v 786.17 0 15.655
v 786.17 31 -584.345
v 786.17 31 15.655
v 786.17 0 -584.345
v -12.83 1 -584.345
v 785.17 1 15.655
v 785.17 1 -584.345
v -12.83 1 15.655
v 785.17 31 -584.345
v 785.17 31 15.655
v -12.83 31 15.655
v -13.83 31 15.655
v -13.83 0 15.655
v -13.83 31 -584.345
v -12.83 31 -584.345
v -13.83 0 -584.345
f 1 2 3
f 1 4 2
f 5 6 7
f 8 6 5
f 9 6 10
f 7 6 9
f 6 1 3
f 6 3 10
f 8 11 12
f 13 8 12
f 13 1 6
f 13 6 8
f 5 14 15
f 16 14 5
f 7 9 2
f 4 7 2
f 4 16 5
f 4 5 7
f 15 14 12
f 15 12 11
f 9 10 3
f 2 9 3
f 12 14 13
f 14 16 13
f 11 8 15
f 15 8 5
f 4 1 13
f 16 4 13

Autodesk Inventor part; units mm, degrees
ref_plane "YZ Plane" through (0, 0, 0) normal (1, 0, 0) x (0, 1, 0)
ref_plane "XZ Plane" through (0, 0, 0) normal (0, 1, 0) x (-1, 0, 0)
ref_plane "XY Plane" through (0, 0, 0) normal (0, 0, 1) x (1, 0, 0)
sketch "Эскиз1" plane through (0, 0, 0) normal (0, 1, 0) x (-1, 0, 0)
  line L0 (13.83, 15.6551) -> (-786.17, 15.6551)
  line L1 (-786.17, 15.6551) -> (-786.17, -584.3449)
  line L2 (-786.17, -584.3449) -> (13.83, -584.3449)
  line L3 (13.83, -584.3449) -> (13.83, 15.6551)
  point P0 (0, 0)
  dimension "d0" = 800
  dimension "d1" = 600
extrude "Выдавливание1" add sketch "Эскиз1" along normal blind 1
sketch "Эскиз2" plane through (0, 1, 0) normal (0, 1, 0) x (1, 0, 0)
  point P0 (0, 0)
sketch "Эскиз3" plane through (0, 1, 0) normal (0, 1, 0) x (1, 0, 0)
  line L0 (-13.83, 584.3449) -> (-13.83, -15.6551) projected
  line L1 (-13.83, -15.6551) -> (-12.83, -15.6551)
  line L2 (-12.83, -15.6551) -> (-12.83, 584.3449)
  line L3 (-12.83, 584.3449) -> (-13.83, 584.3449)
  line L4 (-13.83, 584.3449) -> (-13.83, -15.6551)
  line L5 (-13.83, -15.6551) -> (786.17, -15.6551) projected
  line L6 (786.17, -15.6551) -> (785.17, -15.6551)
  line L7 (785.17, -15.6551) -> (785.17, 584.3449)
  line L8 (785.17, 584.3449) -> (786.17, 584.3449)
  line L9 (786.17, 584.3449) -> (786.17, -15.6551)
  point P0 (0, 0)
  dimension "d4" = 1
  dimension "d5" = 600
  dimension "d6" = 1
  dimension "d7" = 600
extrude "Выдавливание2" add sketch "Эскиз3" along normal blind 30 contours L3 L2 L1 L0
sketch "Эскиз4" plane through (0, 1, 0) normal (0, 1, 0) x (1, 0, 0)
  line L0 (786.17, -15.6551) -> (785.17, -15.6551)
  line L1 (785.17, -15.6551) -> (785.17, 584.3449)
  line L2 (785.17, 584.3449) -> (786.17, 584.3449)
  line L3 (786.17, 584.3449) -> (786.17, -15.6551)
  point P0 (0, 0)
  dimension "d10" = 1
  dimension "d11" = 600
extrude "Выдавливание3" add sketch "Эскиз4" along normal blind 30
properties part number "Полка"
